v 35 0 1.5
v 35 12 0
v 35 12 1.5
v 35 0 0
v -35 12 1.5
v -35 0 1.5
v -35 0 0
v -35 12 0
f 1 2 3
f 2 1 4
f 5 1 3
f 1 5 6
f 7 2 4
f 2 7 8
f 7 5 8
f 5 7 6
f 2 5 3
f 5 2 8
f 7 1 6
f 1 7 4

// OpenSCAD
// 10-well comb for casting agarose gels
// Print orientation: flat on bed, teeth pointing down (-Y)

// ---- Dimensions (mm) ----
plate_t      = 1.5;   // plate thickness (Z)
spine_l      = 70;    // spine length (X)
spine_w      = 12;    // spine width (Y)
tooth_n      = 10;    // number of teeth
tooth_w      = 5.0;   // tooth width (X)
tooth_l      = 12;    // tooth length (Y)
tooth_gap    = 1.5;   // gap between teeth (X)
overcut      = 0.5;   // extra length for clean cuts

$fn = 64;

// ---- Derived ----
pitch   = tooth_w + tooth_gap;            // centre-to-centre spacing
x_start = -(tooth_n - 1) * pitch / 2;     // first tooth centre (row centred)

difference() {
    // Spine (back bar)
    translate([-spine_l / 2, 0, 0])
        cube([spine_l, spine_w, plate_t]);

    // Teeth, cut into the plate
    for (i = [0 : tooth_n - 1])
        translate([x_start + i * pitch - tooth_w / 2,
                   -spine_w - overcut,
                   -overcut])
            cube([tooth_w, tooth_l, plate_t + 2 * overcut]);
}
